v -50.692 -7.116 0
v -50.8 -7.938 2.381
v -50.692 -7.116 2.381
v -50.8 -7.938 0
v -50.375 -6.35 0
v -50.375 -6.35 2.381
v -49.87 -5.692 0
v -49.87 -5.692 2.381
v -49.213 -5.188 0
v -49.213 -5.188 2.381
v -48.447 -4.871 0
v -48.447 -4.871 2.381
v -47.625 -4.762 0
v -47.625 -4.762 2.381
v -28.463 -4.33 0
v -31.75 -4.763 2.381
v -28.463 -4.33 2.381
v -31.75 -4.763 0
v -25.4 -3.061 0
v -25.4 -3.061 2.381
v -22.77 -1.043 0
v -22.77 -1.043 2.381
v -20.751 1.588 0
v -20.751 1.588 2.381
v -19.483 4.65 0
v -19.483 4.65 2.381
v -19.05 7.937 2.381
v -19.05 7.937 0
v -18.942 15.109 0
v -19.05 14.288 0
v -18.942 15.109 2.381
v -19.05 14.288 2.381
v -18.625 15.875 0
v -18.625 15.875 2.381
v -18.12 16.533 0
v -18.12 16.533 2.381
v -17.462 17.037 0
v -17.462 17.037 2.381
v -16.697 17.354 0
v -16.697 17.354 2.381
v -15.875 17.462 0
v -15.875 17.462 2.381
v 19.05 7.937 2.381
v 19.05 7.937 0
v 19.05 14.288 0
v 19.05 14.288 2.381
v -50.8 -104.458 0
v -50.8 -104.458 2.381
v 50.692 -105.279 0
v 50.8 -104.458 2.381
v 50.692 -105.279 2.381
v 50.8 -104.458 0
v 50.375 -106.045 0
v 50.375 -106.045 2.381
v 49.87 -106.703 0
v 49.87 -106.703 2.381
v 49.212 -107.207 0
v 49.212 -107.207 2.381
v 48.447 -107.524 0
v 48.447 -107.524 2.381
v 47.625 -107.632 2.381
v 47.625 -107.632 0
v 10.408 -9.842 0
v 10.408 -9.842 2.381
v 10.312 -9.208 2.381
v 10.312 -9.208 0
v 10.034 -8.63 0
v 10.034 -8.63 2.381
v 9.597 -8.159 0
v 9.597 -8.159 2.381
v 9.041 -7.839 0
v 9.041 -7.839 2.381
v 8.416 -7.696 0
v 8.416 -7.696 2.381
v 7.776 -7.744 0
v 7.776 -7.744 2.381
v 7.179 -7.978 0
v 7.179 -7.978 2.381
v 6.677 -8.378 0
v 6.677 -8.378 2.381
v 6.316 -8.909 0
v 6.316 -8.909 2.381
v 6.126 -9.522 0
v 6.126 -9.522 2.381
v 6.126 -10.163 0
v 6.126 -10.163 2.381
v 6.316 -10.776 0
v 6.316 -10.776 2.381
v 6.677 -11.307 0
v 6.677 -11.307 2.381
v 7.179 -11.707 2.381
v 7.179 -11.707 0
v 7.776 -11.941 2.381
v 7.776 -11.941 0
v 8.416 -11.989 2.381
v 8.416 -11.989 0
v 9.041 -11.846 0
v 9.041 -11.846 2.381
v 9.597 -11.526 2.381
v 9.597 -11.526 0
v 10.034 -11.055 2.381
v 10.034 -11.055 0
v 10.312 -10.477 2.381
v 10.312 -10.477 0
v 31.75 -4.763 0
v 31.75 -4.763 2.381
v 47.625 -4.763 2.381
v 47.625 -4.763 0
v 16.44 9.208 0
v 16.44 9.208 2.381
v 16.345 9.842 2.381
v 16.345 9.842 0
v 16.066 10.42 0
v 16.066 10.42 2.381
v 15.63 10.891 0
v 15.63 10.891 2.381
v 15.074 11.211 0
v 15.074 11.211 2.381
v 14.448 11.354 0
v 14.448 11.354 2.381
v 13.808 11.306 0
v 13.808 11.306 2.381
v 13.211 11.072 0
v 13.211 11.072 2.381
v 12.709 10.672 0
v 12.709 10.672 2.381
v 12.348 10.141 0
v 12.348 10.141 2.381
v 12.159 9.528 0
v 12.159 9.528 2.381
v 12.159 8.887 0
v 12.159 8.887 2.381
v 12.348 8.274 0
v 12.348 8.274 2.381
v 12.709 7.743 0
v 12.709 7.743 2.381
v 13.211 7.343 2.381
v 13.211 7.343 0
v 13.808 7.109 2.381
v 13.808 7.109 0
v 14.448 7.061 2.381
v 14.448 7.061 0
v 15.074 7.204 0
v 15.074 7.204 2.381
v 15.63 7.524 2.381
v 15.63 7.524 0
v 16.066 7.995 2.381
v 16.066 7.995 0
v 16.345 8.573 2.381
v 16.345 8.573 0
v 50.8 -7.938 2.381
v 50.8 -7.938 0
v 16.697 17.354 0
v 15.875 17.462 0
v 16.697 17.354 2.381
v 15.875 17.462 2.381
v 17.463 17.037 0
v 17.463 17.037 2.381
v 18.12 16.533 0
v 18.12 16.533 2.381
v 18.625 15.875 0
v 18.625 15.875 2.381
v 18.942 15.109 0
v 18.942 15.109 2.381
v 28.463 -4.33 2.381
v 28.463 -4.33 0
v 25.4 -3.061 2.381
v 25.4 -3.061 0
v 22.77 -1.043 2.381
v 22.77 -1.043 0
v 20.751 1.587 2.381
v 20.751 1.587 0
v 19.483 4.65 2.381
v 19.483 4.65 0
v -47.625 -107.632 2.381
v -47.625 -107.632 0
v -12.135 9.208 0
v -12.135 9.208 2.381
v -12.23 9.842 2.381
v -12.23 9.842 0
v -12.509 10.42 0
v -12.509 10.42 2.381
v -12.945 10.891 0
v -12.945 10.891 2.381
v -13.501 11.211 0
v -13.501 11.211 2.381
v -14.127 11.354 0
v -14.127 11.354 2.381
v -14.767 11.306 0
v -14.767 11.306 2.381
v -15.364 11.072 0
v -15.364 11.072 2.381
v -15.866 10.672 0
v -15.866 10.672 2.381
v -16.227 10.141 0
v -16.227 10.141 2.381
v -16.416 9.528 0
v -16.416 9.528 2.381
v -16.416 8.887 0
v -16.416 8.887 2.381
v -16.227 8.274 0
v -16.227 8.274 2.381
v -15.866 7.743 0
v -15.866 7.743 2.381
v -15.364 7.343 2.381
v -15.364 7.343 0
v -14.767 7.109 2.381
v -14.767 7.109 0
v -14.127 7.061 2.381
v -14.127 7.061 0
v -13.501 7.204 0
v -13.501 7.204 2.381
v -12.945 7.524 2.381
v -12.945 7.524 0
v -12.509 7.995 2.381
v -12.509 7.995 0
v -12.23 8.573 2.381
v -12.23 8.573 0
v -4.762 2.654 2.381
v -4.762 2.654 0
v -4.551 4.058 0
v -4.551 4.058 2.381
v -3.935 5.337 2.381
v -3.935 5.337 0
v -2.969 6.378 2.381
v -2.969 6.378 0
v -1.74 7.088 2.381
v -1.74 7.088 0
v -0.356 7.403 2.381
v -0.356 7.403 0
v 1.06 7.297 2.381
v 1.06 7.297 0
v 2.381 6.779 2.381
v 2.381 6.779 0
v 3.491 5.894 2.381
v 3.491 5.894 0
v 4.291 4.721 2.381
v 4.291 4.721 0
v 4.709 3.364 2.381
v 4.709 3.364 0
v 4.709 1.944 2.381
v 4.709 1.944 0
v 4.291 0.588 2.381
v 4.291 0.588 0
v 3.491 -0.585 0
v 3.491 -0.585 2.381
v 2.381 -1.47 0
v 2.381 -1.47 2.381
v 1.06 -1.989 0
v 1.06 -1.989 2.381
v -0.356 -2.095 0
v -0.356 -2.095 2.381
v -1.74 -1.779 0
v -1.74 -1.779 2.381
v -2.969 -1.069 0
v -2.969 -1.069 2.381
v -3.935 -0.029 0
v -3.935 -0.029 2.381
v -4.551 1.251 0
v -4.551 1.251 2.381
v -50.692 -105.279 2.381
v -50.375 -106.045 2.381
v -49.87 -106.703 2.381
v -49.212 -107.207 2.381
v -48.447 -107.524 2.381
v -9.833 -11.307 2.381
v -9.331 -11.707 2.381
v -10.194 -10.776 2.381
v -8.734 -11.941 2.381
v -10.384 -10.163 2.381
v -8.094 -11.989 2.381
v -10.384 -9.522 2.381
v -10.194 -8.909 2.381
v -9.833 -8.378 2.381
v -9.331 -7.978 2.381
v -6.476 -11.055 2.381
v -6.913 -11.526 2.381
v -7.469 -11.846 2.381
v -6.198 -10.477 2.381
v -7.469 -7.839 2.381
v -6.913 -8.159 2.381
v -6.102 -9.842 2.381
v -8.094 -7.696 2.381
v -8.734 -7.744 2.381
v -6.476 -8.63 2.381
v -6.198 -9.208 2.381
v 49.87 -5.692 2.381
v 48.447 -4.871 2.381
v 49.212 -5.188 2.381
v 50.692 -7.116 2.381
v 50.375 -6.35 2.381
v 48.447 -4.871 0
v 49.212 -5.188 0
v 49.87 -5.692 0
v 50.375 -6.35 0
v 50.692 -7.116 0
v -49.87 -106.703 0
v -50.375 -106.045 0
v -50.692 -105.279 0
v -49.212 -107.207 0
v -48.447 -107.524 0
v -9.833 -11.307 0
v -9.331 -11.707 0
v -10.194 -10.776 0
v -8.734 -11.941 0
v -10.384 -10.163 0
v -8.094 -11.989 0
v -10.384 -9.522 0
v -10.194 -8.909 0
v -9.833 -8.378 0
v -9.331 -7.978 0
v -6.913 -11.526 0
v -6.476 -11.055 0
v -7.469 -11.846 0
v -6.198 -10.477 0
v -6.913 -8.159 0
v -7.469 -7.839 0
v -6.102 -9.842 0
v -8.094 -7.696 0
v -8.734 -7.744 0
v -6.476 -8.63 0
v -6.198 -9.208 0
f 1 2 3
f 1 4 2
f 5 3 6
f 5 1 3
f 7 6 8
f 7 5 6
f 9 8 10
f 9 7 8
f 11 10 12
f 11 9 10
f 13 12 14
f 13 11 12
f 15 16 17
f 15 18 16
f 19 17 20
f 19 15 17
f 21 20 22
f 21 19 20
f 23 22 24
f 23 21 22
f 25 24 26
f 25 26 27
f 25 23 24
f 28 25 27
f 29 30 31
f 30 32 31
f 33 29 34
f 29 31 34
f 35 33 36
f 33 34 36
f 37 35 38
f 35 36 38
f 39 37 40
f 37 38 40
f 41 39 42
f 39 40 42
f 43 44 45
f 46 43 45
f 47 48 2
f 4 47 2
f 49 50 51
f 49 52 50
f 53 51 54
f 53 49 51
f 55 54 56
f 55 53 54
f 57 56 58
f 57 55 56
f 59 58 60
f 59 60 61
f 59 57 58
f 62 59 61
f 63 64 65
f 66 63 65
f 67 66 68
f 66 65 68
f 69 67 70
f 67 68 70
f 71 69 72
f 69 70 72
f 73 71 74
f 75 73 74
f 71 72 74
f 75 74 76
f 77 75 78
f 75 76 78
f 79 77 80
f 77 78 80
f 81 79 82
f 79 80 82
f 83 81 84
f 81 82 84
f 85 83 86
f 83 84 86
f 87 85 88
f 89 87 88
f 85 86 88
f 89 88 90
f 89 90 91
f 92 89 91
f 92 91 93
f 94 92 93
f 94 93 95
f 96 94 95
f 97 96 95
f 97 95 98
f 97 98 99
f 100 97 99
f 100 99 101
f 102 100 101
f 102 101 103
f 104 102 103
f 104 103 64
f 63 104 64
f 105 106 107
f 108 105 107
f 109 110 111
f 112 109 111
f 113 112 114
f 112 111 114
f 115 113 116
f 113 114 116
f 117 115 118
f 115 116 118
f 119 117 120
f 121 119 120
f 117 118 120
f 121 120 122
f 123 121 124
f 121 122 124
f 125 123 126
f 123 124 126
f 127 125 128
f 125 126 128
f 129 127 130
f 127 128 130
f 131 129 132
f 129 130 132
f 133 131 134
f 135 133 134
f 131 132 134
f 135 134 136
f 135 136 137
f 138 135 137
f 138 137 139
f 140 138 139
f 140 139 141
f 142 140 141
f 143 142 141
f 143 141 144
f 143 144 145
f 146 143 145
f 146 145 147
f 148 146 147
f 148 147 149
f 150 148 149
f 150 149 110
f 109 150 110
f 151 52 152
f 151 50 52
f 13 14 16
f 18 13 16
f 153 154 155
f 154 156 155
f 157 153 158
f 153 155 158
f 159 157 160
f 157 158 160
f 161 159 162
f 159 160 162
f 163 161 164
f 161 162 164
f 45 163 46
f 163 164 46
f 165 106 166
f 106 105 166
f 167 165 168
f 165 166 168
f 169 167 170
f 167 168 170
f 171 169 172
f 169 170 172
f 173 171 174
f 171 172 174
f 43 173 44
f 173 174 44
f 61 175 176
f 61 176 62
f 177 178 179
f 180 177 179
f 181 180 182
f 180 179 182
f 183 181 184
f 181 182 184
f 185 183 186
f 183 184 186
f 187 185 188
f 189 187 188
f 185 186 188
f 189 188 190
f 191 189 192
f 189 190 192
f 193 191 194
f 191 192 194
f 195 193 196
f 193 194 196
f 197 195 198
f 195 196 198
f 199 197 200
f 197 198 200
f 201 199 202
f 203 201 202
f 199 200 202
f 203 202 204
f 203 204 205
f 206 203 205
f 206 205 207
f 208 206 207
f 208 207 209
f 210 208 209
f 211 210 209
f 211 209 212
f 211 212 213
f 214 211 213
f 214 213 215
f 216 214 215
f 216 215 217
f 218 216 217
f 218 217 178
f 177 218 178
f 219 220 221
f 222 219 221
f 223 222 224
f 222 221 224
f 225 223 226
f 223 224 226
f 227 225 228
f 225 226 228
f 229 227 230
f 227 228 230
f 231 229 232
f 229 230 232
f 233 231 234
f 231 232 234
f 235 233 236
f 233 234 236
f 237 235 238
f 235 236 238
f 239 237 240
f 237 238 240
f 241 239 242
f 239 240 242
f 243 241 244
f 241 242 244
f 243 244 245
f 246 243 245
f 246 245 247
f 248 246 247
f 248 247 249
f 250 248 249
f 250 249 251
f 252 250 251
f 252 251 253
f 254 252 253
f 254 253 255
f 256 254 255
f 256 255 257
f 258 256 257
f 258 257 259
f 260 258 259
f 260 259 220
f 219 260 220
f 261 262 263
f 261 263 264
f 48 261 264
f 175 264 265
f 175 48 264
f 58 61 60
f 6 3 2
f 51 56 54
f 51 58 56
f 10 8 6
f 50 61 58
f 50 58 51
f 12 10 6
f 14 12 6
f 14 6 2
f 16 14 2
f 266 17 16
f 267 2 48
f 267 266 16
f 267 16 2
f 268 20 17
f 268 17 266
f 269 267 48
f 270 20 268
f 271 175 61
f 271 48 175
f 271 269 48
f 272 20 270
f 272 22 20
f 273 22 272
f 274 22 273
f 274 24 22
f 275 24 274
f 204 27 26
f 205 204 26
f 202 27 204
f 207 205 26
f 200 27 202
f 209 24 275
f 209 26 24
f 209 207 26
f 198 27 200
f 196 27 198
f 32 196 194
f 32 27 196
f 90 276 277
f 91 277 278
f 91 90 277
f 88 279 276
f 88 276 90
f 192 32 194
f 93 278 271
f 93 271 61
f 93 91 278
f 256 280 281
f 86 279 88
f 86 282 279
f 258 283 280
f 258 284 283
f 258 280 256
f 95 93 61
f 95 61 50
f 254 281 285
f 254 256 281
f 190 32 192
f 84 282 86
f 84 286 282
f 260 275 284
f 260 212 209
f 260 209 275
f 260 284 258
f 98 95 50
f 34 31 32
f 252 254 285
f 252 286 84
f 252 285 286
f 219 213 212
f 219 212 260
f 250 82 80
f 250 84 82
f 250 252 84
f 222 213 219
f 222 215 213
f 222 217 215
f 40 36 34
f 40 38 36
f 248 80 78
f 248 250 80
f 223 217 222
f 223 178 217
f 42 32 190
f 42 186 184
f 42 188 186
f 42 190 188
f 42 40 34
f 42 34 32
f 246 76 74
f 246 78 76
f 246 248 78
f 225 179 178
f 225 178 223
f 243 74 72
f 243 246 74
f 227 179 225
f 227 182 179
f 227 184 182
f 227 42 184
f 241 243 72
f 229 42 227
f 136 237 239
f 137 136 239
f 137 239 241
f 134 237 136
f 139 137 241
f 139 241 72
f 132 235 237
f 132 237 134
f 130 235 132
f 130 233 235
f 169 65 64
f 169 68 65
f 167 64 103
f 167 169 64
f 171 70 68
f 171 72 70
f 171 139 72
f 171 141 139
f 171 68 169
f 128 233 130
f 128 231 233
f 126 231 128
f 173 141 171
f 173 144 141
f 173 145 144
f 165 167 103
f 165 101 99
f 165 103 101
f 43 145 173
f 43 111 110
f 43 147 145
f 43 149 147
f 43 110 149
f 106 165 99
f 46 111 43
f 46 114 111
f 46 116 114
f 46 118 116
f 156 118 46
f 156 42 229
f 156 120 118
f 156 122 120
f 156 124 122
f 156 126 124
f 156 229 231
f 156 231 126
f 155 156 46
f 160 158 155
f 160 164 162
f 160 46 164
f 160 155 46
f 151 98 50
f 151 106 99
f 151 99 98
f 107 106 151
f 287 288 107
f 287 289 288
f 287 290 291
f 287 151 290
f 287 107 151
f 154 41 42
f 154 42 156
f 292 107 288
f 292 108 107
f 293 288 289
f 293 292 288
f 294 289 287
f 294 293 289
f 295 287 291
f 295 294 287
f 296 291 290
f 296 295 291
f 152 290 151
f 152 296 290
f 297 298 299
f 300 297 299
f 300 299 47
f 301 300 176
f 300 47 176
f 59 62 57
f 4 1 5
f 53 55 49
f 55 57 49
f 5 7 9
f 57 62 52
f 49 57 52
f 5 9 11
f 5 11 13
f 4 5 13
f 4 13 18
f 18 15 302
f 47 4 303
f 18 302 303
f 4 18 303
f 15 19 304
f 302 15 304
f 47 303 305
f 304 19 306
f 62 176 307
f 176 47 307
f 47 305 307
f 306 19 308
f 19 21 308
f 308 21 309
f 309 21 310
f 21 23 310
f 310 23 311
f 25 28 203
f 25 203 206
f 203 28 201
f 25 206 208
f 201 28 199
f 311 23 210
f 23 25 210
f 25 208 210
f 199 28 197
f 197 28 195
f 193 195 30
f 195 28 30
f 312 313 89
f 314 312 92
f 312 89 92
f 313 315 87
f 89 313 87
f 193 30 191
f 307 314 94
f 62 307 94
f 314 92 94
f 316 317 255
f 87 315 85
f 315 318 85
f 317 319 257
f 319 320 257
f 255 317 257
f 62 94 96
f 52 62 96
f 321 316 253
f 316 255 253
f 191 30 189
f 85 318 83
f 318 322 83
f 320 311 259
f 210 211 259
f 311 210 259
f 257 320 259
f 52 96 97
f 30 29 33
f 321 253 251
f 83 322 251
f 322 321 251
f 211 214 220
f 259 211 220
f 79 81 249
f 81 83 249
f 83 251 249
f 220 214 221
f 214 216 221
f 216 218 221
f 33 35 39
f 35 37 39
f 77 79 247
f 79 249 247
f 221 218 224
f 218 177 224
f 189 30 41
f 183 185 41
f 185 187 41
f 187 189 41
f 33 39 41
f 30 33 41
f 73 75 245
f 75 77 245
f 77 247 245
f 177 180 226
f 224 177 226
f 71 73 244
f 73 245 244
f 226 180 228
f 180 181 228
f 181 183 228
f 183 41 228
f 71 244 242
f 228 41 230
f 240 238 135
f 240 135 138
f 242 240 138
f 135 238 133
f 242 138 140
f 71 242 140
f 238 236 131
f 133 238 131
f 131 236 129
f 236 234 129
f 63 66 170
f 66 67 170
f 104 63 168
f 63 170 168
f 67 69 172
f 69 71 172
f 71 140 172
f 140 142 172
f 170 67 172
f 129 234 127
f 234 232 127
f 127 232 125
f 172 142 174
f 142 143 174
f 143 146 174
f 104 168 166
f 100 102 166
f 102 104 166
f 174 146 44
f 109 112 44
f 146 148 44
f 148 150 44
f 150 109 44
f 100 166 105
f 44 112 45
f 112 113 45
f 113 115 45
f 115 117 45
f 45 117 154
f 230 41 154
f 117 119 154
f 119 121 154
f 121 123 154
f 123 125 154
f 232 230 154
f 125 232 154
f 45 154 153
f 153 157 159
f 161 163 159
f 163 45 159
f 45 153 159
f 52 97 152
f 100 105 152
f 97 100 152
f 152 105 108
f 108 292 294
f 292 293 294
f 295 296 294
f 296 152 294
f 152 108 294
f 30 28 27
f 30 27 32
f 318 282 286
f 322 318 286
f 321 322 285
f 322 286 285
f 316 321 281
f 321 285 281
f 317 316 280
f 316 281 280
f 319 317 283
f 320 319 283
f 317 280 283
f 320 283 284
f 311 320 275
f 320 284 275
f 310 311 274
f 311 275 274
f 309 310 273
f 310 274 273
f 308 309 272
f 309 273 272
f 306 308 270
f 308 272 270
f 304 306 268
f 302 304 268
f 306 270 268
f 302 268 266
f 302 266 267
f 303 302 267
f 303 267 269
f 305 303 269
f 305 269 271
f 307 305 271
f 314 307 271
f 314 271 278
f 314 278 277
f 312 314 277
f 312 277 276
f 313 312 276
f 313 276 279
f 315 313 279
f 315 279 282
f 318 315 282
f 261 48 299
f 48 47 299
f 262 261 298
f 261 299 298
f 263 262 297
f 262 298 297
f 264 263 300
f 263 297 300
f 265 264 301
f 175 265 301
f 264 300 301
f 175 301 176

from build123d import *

# Parameters (mm, degrees)
SKETCH1_W                 = 38.1
SKETCH1_H                 = 34.925
BOSS_EXTRUDE1_DEPTH       = 2.38125
SKETCH5_W                 = 101.6
SKETCH5_H                 = 90.17
BOSS_EXTRUDE2_DEPTH       = 2.38125
CUT_EXTRUDE2_REACH        = 121.042
SKETCH6_R                 = 4.7625
F_8_CLEARANCE_HOLE1_D     = 4.3053
F_8_CLEARANCE_HOLE1_DEPTH = 12.7
F_8_CLEARANCE_HOLE1_TIP   = 1.293442612
SKETCH11_W                = 31.75
SKETCH11_H                = 12.7
BOSS_EXTRUDE3_DEPTH       = 2.38125
FILLET3_R                 = 3.175
FILLET4_R                 = 12.7


with BuildPart() as part:
    # Sketch1 → Boss-Extrude1 (new body)
    with BuildSketch(Plane.XY):
        Rectangle(SKETCH1_W, SKETCH1_H)
    extrude(amount=BOSS_EXTRUDE1_DEPTH)

    # Sketch5 → Boss-Extrude2 (add)
    with BuildSketch(Plane.XY.offset(2.38125)):
        with Locations((0, -62.5475)):
            Rectangle(SKETCH5_W, SKETCH5_H)
    extrude(amount=-BOSS_EXTRUDE2_DEPTH)

    # Sketch6 → Cut-Extrude2 (cut, up to next)
    with BuildSketch(Plane(origin=(0, 0, 0), x_dir=(-1, 0, 0), z_dir=(0, 0, -1)), mode=Mode.PRIVATE) as cut_extrude2_sk1:
        with Locations((0, 2.6543)):
            Circle(SKETCH6_R)
    cut_extrude2_tool1 = extrude(cut_extrude2_sk1.sketch, amount=-CUT_EXTRUDE2_REACH, mode=Mode.PRIVATE) & part.part
    add(cut_extrude2_tool1.solids().sort_by_distance((0, 2.6543, 0))[0], mode=Mode.SUBTRACT)

    # #8 Clearance Hole1
    with Locations(Plane(origin=(0, 0, 0), x_dir=(-1, 0, 0), z_dir=(0, 0, -1))):
        with Locations((-8.255, -9.8425), (8.255, -9.8425), (-14.2875, 9.2075), (14.2875, 9.2075)):
            Hole(F_8_CLEARANCE_HOLE1_D / 2, depth=F_8_CLEARANCE_HOLE1_DEPTH)
            with Locations((0, 0, -(F_8_CLEARANCE_HOLE1_DEPTH + F_8_CLEARANCE_HOLE1_TIP / 2))):  # 118° drill point
                Cone(0, F_8_CLEARANCE_HOLE1_D / 2, F_8_CLEARANCE_HOLE1_TIP, mode=Mode.SUBTRACT)

    # Sketch11 → Boss-Extrude3 (add)
    with BuildSketch(Plane.XY.offset(2.38125)):
        with Locations((-34.925, -11.1125)):
            Rectangle(SKETCH11_W, SKETCH11_H)
        with Locations((34.925, -11.1125)):
            Rectangle(SKETCH11_W, SKETCH11_H)
    extrude(amount=-BOSS_EXTRUDE3_DEPTH)

    # Fillet3
    fillet3_edges = [part.edges().sort_by_distance(p)[0] for p in [
        (-50.8, -107.6325, 1.190625),
        (50.8, -107.6325, 1.190625),
        (-19.05, 17.4625, 1.190625),
        (19.05, 17.4625, 1.190625),
        (50.8, -4.7625, 1.190625),
        (-50.8, -4.7625, 1.190625),
    ]]
    fillet(fillet3_edges, radius=FILLET3_R)

    # Fillet4
    fillet4_edges = [part.edges().sort_by_distance(p)[0] for p in [
        (19.05, -4.7625, 1.190625),
        (-19.05, -4.7625, 1.190625),
    ]]
    fillet(fillet4_edges, radius=FILLET4_R)


solid = part.part
